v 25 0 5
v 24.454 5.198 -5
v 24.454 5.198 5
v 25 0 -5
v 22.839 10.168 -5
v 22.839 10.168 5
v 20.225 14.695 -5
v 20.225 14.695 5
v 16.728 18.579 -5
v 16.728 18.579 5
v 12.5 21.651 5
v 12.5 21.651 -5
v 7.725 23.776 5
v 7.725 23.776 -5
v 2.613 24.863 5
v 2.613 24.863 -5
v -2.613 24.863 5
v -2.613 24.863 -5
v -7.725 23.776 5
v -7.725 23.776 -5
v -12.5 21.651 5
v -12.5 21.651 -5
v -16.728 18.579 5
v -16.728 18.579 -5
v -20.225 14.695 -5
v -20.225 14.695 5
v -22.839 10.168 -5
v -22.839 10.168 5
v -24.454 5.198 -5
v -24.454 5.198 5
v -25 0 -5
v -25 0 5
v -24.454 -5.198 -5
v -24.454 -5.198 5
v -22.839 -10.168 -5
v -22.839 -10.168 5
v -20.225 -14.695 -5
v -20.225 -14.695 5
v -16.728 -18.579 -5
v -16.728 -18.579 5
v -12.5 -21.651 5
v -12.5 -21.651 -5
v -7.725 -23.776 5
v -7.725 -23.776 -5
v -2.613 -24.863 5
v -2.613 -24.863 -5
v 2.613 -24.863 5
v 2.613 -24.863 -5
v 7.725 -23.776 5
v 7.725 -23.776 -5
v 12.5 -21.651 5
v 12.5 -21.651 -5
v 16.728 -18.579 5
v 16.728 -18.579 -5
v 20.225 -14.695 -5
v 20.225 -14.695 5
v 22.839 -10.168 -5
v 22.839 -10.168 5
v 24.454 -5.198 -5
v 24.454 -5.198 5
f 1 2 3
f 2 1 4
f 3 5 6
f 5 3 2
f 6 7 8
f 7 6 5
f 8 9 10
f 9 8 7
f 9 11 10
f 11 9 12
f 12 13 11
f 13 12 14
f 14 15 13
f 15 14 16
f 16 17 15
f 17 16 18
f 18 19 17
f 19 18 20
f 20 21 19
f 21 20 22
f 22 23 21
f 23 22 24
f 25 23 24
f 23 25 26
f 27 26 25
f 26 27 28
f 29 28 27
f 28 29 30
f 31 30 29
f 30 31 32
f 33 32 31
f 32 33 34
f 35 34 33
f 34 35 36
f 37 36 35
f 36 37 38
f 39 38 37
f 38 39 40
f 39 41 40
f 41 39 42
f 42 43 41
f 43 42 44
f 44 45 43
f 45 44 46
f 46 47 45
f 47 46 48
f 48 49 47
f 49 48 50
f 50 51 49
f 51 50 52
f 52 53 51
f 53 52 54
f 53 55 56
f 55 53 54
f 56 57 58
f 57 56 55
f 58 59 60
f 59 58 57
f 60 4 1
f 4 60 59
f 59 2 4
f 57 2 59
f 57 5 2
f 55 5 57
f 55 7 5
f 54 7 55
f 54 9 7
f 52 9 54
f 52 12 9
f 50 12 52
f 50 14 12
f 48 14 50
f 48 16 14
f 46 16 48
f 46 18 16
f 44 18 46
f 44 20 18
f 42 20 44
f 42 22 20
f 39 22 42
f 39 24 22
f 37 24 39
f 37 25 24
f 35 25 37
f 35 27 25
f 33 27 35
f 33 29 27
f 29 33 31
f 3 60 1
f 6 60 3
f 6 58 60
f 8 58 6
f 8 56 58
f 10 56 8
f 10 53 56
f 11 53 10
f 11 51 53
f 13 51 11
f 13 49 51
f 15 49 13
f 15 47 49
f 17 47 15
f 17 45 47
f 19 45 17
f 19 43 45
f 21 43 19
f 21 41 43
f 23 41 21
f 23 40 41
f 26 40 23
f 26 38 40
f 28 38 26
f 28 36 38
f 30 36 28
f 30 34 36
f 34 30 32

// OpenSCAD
// file: parameters.scad
//All parameters

link_gear_r = 25;
link_gear_h = 10;

paddle_gear_r = 20;
paddle_gear_h = 10;

paddle_shaft_r = 5;
paddle_shaft_h = 400;

upper_length_resolution = 8;
hook_w = 5;
hook_t = 2;
hook_gap = 0.1;
shell = 1.5;
groove = 2.5;

paddle_upper_l = 35;
paddle_upper_t = shell*3.2;
paddle_upper_w = 12;

slide_gap = 0.1;
forearm_w = paddle_upper_w-shell*2-slide_gap*2;
wrist_joint_outer = forearm_w/2;
wrist_joint_inner = wrist_joint_outer/3;

forearm_t = paddle_upper_t-shell*2-slide_gap*2;
forearm_l = paddle_upper_l+wrist_joint_outer;

bolt_r = wrist_joint_inner-slide_gap;
bolt_h = forearm_t*2+slide_gap;
bolt_groove = bolt_r*0.4;

head_hook = bolt_groove/2-slide_gap*2;
head_r = bolt_r+head_hook;

clip_l = shell*4+hook_t+slide_gap;
clip_h = shell*2+forearm_t;

thumb_hook_h = shell*2;
thumb_hook_t = shell;
thumb_hook_l = shell*3;
hook_h = shell*2+thumb_hook_h;

pos1 = 1;
pos2 = 0;
wrist_angle = 0;
paddle_upper_declination = 180;
declination_offset = (paddle_upper_w)/(paddle_upper_l*2)*(180/3.1415);

paddle_bar_h = 100;
paddle_bar_r = 10;

paddle_upper_declination = 210;
paddle_gear_elivation = 45;
// file: link_gear.scad
include <parameters.scad>;

module link_gear(){
	cylinder(r = link_gear_r, h = link_gear_h, center = true);
}

link_gear();
// main file
include <link_gear.scad>;

paddle_gear_r = 50;
paddle_gear_h = 15;
paddle_gear_declination = 45;
paddle_gear_span = link_gear_r+(link_gear_r+paddle_gear_r)*cos(paddle_gear_declination);
paddle_gear_depth = (link_gear_r+paddle_gear_r)*sin(paddle_gear_declination);
module paddle_gear(){
	cylinder(r = paddle_gear_r, h = paddle_gear_h, center = true);
}

//paddle_gear();
